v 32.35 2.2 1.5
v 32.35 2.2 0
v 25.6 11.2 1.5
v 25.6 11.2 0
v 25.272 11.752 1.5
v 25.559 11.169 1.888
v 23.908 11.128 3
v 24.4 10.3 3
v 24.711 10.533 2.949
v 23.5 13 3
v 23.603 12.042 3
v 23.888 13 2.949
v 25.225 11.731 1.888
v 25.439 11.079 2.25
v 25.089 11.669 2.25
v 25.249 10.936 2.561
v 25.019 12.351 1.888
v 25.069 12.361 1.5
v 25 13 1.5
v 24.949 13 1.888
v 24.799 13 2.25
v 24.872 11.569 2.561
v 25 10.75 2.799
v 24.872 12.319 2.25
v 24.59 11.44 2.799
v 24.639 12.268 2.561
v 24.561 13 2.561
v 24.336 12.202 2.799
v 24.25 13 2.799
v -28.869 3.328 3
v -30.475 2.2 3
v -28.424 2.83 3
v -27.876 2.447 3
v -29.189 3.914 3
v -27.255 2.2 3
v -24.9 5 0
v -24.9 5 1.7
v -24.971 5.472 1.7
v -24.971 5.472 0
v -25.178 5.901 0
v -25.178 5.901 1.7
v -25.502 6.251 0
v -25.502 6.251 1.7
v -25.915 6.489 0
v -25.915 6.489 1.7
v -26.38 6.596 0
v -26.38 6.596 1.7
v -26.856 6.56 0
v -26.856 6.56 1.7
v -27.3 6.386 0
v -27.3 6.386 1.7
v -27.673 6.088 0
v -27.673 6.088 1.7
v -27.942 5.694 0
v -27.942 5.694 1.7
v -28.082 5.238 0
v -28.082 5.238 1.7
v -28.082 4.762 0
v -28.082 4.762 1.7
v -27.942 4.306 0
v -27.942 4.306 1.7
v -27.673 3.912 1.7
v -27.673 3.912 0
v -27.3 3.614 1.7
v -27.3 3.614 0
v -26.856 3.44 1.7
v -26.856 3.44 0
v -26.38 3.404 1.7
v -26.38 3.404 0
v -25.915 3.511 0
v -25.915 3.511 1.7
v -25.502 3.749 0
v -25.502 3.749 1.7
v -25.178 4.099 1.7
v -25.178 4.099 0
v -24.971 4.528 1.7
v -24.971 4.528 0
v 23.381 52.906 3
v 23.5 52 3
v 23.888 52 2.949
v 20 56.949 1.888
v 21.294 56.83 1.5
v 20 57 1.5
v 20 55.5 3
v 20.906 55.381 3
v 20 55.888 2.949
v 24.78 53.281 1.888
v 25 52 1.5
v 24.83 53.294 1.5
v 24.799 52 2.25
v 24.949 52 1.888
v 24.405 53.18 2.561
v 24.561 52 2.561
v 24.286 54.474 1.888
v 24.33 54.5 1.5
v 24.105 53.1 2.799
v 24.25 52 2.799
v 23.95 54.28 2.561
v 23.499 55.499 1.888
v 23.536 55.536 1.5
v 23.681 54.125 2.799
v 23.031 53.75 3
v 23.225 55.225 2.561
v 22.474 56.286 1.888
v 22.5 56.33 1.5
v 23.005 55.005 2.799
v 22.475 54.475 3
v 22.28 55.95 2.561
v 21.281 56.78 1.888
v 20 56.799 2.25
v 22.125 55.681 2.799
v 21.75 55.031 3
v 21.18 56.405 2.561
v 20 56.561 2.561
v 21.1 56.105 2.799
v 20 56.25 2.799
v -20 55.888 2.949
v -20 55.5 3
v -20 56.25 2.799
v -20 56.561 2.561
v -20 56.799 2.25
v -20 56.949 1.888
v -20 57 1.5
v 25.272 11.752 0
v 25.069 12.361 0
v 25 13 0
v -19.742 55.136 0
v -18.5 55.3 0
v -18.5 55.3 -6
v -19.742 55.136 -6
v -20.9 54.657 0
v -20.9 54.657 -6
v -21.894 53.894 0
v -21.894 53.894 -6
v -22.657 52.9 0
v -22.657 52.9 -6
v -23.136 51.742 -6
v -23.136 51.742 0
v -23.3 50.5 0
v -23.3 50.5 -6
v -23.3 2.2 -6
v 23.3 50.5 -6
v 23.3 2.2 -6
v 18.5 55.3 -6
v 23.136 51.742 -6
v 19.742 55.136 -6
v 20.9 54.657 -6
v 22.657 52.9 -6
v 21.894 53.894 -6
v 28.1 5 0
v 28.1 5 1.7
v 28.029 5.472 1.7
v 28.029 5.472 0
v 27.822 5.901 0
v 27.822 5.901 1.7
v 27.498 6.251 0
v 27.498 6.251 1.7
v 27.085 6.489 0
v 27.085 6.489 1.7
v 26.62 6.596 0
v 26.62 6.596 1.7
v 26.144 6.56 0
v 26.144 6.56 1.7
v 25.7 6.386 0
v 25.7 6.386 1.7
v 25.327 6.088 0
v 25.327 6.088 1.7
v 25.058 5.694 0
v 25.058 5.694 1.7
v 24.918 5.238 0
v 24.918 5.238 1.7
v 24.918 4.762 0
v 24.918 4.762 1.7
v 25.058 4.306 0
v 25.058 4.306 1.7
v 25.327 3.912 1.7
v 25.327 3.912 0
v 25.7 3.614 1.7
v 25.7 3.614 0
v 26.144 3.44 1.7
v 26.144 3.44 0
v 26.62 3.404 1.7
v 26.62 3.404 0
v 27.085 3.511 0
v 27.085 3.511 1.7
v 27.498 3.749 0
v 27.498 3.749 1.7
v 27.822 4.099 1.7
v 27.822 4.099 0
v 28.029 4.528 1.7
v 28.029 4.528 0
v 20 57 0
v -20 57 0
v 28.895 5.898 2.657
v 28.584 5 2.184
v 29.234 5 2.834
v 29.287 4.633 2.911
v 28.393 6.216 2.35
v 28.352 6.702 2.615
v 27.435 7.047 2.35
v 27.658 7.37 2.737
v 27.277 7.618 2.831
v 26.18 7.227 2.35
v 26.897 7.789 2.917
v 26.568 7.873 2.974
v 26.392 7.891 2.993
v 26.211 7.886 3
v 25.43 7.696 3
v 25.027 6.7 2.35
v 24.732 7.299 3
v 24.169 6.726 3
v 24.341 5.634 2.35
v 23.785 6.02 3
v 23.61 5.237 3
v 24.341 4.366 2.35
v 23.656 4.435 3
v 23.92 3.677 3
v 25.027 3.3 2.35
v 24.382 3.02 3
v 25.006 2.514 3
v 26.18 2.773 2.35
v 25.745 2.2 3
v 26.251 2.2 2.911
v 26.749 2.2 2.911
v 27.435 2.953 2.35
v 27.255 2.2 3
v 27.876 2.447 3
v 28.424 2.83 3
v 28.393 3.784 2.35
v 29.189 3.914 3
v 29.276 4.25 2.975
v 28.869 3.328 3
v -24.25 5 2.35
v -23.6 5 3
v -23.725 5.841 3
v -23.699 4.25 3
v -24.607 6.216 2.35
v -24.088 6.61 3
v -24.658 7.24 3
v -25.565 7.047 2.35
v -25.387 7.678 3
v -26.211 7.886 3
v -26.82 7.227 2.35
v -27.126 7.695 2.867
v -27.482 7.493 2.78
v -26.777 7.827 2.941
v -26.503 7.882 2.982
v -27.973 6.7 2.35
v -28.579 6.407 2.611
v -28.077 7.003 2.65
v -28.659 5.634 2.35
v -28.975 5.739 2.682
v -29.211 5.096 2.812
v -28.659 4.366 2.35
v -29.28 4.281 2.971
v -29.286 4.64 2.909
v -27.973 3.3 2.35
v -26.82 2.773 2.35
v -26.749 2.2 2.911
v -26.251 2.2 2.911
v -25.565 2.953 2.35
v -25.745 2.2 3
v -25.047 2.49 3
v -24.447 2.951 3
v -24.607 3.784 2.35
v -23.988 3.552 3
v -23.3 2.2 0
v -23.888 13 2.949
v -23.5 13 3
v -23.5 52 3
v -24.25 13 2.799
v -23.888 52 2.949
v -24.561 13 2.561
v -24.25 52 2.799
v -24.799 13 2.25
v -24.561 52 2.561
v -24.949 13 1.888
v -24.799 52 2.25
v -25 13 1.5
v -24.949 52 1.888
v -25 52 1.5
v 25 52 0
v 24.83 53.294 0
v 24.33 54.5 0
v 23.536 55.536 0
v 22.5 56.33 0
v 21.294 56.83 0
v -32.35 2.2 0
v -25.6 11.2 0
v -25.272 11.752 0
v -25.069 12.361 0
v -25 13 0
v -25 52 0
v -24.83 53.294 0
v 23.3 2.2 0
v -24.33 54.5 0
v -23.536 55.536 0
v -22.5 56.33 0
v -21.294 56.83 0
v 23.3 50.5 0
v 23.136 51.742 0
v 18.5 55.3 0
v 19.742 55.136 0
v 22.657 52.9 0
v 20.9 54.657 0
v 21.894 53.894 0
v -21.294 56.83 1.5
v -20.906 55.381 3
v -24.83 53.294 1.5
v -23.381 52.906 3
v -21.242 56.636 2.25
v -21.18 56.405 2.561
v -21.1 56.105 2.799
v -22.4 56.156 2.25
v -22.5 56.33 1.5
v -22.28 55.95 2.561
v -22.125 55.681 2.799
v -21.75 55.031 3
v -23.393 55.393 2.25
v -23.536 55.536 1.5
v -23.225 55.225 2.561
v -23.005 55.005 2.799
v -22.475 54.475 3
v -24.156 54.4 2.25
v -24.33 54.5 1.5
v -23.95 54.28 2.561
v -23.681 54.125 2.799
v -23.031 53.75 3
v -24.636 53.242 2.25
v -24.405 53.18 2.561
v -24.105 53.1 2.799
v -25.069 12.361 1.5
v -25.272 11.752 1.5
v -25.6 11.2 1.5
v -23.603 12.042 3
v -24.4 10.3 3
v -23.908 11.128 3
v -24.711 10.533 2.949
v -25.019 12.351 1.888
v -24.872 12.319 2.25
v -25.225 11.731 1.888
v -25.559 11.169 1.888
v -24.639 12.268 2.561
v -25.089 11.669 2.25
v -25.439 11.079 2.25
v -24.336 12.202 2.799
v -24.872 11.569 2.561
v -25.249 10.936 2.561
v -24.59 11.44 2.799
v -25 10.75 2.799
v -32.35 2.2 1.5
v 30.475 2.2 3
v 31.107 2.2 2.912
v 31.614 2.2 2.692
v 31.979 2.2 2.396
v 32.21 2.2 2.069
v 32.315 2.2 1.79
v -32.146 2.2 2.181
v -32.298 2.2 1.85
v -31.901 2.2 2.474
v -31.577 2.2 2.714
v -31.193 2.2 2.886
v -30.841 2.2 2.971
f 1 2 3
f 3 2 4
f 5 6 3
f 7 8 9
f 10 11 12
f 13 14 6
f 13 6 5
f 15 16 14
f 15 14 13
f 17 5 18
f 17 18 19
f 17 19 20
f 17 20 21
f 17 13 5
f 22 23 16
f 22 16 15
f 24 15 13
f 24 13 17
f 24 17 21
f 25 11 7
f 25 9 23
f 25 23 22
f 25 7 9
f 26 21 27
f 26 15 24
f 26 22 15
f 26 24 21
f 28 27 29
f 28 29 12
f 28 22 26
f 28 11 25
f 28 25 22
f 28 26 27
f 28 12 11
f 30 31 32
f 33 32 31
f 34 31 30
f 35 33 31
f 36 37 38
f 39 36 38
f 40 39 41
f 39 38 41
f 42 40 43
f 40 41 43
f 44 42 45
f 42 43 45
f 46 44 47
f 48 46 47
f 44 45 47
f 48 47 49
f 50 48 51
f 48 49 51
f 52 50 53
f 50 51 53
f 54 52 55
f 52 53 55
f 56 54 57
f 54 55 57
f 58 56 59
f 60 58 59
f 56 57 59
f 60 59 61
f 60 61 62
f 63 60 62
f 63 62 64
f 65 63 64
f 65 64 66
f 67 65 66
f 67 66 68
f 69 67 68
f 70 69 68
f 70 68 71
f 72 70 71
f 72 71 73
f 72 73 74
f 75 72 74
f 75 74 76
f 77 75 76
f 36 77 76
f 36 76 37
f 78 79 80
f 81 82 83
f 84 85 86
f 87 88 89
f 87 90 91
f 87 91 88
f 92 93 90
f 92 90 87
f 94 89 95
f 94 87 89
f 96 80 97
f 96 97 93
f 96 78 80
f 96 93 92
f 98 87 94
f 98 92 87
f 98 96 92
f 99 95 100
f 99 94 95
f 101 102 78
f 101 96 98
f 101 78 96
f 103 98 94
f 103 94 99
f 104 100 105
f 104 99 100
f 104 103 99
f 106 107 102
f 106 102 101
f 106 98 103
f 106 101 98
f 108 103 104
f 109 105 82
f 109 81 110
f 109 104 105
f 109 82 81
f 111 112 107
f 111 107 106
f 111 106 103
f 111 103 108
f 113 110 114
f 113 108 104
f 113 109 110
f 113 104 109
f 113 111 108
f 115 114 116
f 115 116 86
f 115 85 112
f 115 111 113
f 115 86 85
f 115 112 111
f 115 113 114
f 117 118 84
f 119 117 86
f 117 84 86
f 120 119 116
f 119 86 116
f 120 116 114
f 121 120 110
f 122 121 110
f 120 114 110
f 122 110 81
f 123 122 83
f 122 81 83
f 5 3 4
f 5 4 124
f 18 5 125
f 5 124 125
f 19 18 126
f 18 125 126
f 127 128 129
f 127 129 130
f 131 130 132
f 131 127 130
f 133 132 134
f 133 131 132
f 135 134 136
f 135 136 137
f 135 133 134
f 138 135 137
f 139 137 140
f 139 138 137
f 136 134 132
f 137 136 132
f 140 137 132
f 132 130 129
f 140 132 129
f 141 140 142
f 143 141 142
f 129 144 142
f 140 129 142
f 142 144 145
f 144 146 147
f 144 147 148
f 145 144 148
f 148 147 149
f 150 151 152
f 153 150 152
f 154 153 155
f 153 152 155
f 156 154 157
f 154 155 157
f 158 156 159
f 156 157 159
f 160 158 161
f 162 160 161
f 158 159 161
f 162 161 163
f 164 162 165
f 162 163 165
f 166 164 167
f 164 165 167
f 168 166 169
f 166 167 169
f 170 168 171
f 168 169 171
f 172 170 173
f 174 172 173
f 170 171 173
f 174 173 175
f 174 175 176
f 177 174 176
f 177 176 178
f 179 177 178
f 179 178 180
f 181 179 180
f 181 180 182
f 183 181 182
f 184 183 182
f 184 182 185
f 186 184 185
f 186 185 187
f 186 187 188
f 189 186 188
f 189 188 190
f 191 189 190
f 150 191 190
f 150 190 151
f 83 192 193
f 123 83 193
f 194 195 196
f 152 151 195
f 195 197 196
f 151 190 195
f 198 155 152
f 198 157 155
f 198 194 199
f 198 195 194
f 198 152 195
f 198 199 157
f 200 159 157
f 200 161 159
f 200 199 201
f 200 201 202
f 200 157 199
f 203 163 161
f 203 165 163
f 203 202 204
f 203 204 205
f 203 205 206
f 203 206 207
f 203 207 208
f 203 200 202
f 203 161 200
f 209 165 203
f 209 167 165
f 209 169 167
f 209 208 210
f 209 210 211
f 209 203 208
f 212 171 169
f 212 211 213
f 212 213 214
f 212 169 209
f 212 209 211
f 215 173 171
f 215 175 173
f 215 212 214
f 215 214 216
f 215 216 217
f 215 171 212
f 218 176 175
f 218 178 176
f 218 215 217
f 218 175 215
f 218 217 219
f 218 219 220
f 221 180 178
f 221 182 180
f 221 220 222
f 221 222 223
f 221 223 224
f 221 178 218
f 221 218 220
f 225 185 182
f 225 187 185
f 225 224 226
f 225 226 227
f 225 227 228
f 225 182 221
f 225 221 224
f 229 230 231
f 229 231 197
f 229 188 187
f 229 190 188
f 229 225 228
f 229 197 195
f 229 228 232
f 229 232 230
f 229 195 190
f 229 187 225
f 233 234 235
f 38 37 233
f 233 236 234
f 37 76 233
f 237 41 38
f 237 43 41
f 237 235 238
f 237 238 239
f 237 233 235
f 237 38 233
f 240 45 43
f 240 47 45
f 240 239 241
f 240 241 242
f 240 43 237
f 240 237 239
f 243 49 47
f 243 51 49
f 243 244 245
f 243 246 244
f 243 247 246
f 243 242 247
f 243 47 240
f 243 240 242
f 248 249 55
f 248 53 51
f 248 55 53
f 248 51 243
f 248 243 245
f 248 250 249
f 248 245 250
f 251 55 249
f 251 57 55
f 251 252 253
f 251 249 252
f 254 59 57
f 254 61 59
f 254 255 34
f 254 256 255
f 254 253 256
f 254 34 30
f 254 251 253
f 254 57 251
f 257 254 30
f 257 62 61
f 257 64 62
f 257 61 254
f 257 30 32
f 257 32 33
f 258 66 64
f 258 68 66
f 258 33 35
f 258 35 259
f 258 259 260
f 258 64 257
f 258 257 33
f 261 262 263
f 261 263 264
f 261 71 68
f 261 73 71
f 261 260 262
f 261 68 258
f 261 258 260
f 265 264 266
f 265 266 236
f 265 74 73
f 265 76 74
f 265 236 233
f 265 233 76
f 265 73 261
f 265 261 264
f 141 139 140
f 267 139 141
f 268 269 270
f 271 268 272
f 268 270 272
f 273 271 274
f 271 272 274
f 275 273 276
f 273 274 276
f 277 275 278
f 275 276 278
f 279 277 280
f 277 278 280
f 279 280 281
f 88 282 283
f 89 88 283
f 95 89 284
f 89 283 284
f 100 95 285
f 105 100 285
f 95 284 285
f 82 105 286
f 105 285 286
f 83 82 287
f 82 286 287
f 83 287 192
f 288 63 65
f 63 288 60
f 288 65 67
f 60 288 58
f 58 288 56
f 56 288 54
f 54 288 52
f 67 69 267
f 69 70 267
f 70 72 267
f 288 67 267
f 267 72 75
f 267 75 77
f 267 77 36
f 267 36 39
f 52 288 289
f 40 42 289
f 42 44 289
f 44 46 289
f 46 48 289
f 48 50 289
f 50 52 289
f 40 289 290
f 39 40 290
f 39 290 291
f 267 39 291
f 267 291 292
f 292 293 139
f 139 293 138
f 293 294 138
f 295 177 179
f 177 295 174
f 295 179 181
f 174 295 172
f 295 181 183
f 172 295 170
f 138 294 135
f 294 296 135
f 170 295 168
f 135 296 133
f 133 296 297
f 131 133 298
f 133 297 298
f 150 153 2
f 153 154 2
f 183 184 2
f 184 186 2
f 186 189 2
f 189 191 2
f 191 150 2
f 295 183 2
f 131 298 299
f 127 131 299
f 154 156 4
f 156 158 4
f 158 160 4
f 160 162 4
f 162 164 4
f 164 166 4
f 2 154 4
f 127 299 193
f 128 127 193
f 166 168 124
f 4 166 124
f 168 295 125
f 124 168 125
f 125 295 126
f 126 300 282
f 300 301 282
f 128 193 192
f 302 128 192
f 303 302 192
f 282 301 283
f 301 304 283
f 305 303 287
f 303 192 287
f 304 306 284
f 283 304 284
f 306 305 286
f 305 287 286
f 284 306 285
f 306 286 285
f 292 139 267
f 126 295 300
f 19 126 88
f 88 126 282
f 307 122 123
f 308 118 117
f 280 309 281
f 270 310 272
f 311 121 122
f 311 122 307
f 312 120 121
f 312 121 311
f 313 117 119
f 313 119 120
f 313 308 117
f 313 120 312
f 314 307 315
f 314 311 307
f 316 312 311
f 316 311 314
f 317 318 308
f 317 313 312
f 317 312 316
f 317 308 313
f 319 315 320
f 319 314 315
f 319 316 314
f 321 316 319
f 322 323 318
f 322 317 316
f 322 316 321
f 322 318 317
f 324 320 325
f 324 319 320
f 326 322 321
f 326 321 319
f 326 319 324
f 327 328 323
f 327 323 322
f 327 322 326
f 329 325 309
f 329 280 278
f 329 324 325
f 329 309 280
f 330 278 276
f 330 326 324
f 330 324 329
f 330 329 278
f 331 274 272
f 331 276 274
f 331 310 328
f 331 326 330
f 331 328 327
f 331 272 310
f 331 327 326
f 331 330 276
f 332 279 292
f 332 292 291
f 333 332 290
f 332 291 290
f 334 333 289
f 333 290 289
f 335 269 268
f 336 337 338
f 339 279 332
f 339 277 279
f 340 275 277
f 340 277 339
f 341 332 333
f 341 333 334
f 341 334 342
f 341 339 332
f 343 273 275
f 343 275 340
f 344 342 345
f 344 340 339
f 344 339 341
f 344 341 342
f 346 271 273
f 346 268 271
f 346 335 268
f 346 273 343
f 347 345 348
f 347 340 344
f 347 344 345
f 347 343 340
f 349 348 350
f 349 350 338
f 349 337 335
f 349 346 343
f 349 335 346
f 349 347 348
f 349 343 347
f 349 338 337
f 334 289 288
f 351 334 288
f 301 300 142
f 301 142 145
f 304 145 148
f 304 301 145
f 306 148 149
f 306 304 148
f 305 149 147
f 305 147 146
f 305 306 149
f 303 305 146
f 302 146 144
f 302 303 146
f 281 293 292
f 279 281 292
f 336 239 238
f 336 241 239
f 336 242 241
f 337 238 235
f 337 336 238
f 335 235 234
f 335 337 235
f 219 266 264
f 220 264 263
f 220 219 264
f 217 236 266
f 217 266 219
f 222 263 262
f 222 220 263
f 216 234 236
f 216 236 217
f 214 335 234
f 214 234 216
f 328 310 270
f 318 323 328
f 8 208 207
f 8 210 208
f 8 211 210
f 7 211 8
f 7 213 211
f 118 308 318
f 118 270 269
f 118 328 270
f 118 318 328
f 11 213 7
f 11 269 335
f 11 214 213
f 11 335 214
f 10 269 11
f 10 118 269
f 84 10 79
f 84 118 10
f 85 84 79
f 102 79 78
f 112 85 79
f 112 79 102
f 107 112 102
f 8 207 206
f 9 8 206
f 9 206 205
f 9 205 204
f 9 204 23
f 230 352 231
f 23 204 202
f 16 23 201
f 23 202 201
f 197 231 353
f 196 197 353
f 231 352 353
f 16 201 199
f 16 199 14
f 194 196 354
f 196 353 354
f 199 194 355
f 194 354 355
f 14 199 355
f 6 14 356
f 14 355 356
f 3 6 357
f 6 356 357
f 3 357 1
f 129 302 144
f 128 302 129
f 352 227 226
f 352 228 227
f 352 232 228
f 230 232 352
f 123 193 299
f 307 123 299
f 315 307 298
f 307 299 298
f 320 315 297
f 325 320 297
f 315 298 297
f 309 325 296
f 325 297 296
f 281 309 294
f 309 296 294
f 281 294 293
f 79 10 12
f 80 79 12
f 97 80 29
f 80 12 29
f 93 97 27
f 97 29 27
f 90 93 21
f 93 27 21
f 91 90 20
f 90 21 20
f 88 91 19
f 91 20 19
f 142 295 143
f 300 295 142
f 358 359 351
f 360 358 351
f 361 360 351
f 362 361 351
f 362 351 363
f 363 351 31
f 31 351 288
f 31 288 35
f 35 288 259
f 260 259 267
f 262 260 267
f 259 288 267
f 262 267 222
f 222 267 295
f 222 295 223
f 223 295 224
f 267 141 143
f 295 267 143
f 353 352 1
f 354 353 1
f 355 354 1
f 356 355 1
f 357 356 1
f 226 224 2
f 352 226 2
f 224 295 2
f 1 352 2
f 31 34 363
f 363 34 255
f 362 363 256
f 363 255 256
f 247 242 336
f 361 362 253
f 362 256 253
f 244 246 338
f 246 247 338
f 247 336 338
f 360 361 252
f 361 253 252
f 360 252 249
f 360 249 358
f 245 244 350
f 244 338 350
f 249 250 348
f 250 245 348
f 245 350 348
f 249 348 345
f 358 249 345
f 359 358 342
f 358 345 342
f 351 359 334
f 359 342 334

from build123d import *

# Parameters (mm, degrees)
BOSS_EXTRUDE1_DEPTH = 6
BOSS_EXTRUDE2_DEPTH = 3
SKETCH3_R           = 1.6
CUT_EXTRUDE1_DEPTH  = 67.155290794
CHAMFER1_SIZE       = 1.3
FILLET1_R           = 1.5


with BuildPart() as part:
    # Sketch1 → Boss-Extrude1 (new body)
    with BuildSketch(Plane.XY):
        with BuildLine():
            Line((-23.3, 50.5), (-23.3, 2.2))
            Line((-23.3, 2.2), (23.3, 2.2))
            Line((23.3, 2.2), (23.3, 50.5))
            ThreePointArc((23.3, 50.5), (21.89411255, 53.89411255), (18.5, 55.3))
            Line((18.5, 55.3), (-18.5, 55.3))
            ThreePointArc((-18.5, 55.3), (-21.89411255, 53.89411255), (-23.3, 50.5))
        make_face()
    extrude(amount=-BOSS_EXTRUDE1_DEPTH)

    # Sketch2 → Boss-Extrude2 (add)
    with BuildSketch(Plane.XY):
        with BuildLine():
            Line((-25.6, 11.2), (-32.35, 2.2))
            Line((-32.35, 2.2), (-23.3, 2.2))
            Line((-23.3, 2.2), (23.3, 2.2))
            Line((23.3, 2.2), (32.35, 2.2))
            Line((32.35, 2.2), (25.6, 11.2))
            ThreePointArc((25.6, 11.2), (25.153950106, 12.051316702), (25, 13))
            Line((25, 13), (25, 52))
            ThreePointArc((25, 52), (23.535533906, 55.535533906), (20, 57))
            Line((20, 57), (-20, 57))
            ThreePointArc((-20, 57), (-23.535533906, 55.535533906), (-25, 52))
            Line((-25, 52), (-25, 13))
            ThreePointArc((-25, 13), (-25.153950106, 12.051316702), (-25.6, 11.2))
        make_face()
    extrude(amount=BOSS_EXTRUDE2_DEPTH)

    # Sketch3 → Cut-Extrude1 (cut, through all)
    with BuildSketch(Plane.XY.offset(3)):
        with Locations((-26.5, 5)):
            Circle(SKETCH3_R)
        with Locations((26.5, 5)):
            Circle(SKETCH3_R)
    extrude(amount=-CUT_EXTRUDE1_DEPTH, mode=Mode.SUBTRACT)

    # Chamfer1
    # the kernel refuses this chamfer: 1.3 mm, written as the material it takes off along each edge
    with BuildSketch(Plane(origin=(-26.5, 5, 3), x_dir=(1, 0, 0), z_dir=(0, -1, 0))) as chamfer1_piece_1:
        Polygon((1.6 + CHAMFER1_SIZE, 0), (1.6, -CHAMFER1_SIZE), (1.6, 0), align=None)
    revolve(axis=Axis((-26.5, 5, 3), (0, 0, 1)), mode=Mode.SUBTRACT)
    with BuildSketch(Plane(origin=(26.5, 5, 3), x_dir=(1, 0, 0), z_dir=(0, -1, 0))) as chamfer1_piece_2:
        Polygon((1.6 + CHAMFER1_SIZE, 0), (1.6, -CHAMFER1_SIZE), (1.6, 0), align=None)
    revolve(axis=Axis((26.5, 5, 3), (0, 0, 1)), mode=Mode.SUBTRACT)

    # Fillet1
    # the kernel refuses this fillet: 1.5 mm, written as the material it takes off along each edge
    with BuildSketch(Plane(origin=(-28, 13, 3), x_dir=(1, 0, 0), z_dir=(0, 1, 0))) as fillet1_piece_1:
        with BuildLine():
            CenterArc((3 + FILLET1_R, FILLET1_R), FILLET1_R, 180, 90)
            Line((3 + FILLET1_R, 0), (3, 0))
            Line((3, 0), (3, FILLET1_R))
        make_face()
    revolve(axis=Axis((-28, 13, 3), (0, 0, -1)), revolution_arc=36.869897646, mode=Mode.SUBTRACT)
    with BuildSketch(Plane(origin=(-25.6, 11.2, 3), x_dir=(0, 0, -1), z_dir=(-0.6000000000000002, -0.7999999999999998, 0))) as fillet1_piece_2:
        with BuildLine():
            CenterArc((FILLET1_R, FILLET1_R), FILLET1_R, 180, 90)
            Line((0, FILLET1_R), (0, 0))
            Line((0, 0), (FILLET1_R, 0))
        make_face()
    extrude(amount=15, mode=Mode.SUBTRACT)
    with BuildSketch(Plane(origin=(34.6, -0.8, 3), x_dir=(-0.800000000000001, -0.5999999999999985, 0), z_dir=(-0.5999999999999985, 0.8000000000000012, 0))) as fillet1_piece_3:
        with BuildLine():
            CenterArc((FILLET1_R, -FILLET1_R), FILLET1_R, 90, 90)
            Line((0, -FILLET1_R), (0, 0))
            Line((0, 0), (FILLET1_R, 0))
        make_face()
    extrude(amount=15, mode=Mode.SUBTRACT)
    with BuildSketch(Plane(origin=(28, 13, 3), x_dir=(-0.8000000000000014, -0.5999999999999981, 0), z_dir=(0.5999999999999981, -0.8000000000000014, 0))) as fillet1_piece_4:
        with BuildLine():
            CenterArc((3 + FILLET1_R, FILLET1_R), FILLET1_R, 180, 90)
            Line((3, FILLET1_R), (3, 0))
            Line((3, 0), (3 + FILLET1_R, 0))
        make_face()
    revolve(axis=Axis((28, 13, 3), (0, 0, -1)), revolution_arc=36.869897646, mode=Mode.SUBTRACT)
    with BuildSketch(Plane(origin=(25, 13, 3), x_dir=(-1, 0, 0), z_dir=(0, 1, 0)), Plane(origin=(-25, 52, 3), x_dir=(1, 0, 0), z_dir=(0, -1, 0))) as fillet1_piece_5:
        with BuildLine():
            CenterArc((FILLET1_R, -FILLET1_R), FILLET1_R, 90, 90)
            Line((0, -FILLET1_R), (0, 0))
            Line((0, 0), (FILLET1_R, 0))
        make_face()
    extrude(amount=39, mode=Mode.SUBTRACT)
    with BuildSketch(Plane(origin=(20, 52, 3), x_dir=(1, 0, 0), z_dir=(0, -1, 0))) as fillet1_piece_6:
        with BuildLine():
            CenterArc((5 - FILLET1_R, -FILLET1_R), FILLET1_R, 0, 90)
            Line((5, -FILLET1_R), (5, 0))
            Line((5, 0), (5 - FILLET1_R, 0))
        make_face()
    revolve(axis=Axis((20, 52, 3), (0, 0, 1)), revolution_arc=90, mode=Mode.SUBTRACT)
    with BuildSketch(Plane(origin=(20, 57, 3), x_dir=(0, -1, 0), z_dir=(-1, 0, 0))) as fillet1_piece_7:
        with BuildLine():
            CenterArc((FILLET1_R, -FILLET1_R), FILLET1_R, 90, 90)
            Line((0, -FILLET1_R), (0, 0))
            Line((0, 0), (FILLET1_R, 0))
        make_face()
    extrude(amount=40, mode=Mode.SUBTRACT)
    with BuildSketch(Plane(origin=(-20, 52, 3), x_dir=(0, 1, 0), z_dir=(1, 0, 0))) as fillet1_piece_8:
        with BuildLine():
            CenterArc((5 - FILLET1_R, -FILLET1_R), FILLET1_R, 0, 90)
            Line((5, -FILLET1_R), (5, 0))
            Line((5, 0), (5 - FILLET1_R, 0))
        make_face()
    revolve(axis=Axis((-20, 52, 3), (0, 0, 1)), revolution_arc=90, mode=Mode.SUBTRACT)


solid = part.part
